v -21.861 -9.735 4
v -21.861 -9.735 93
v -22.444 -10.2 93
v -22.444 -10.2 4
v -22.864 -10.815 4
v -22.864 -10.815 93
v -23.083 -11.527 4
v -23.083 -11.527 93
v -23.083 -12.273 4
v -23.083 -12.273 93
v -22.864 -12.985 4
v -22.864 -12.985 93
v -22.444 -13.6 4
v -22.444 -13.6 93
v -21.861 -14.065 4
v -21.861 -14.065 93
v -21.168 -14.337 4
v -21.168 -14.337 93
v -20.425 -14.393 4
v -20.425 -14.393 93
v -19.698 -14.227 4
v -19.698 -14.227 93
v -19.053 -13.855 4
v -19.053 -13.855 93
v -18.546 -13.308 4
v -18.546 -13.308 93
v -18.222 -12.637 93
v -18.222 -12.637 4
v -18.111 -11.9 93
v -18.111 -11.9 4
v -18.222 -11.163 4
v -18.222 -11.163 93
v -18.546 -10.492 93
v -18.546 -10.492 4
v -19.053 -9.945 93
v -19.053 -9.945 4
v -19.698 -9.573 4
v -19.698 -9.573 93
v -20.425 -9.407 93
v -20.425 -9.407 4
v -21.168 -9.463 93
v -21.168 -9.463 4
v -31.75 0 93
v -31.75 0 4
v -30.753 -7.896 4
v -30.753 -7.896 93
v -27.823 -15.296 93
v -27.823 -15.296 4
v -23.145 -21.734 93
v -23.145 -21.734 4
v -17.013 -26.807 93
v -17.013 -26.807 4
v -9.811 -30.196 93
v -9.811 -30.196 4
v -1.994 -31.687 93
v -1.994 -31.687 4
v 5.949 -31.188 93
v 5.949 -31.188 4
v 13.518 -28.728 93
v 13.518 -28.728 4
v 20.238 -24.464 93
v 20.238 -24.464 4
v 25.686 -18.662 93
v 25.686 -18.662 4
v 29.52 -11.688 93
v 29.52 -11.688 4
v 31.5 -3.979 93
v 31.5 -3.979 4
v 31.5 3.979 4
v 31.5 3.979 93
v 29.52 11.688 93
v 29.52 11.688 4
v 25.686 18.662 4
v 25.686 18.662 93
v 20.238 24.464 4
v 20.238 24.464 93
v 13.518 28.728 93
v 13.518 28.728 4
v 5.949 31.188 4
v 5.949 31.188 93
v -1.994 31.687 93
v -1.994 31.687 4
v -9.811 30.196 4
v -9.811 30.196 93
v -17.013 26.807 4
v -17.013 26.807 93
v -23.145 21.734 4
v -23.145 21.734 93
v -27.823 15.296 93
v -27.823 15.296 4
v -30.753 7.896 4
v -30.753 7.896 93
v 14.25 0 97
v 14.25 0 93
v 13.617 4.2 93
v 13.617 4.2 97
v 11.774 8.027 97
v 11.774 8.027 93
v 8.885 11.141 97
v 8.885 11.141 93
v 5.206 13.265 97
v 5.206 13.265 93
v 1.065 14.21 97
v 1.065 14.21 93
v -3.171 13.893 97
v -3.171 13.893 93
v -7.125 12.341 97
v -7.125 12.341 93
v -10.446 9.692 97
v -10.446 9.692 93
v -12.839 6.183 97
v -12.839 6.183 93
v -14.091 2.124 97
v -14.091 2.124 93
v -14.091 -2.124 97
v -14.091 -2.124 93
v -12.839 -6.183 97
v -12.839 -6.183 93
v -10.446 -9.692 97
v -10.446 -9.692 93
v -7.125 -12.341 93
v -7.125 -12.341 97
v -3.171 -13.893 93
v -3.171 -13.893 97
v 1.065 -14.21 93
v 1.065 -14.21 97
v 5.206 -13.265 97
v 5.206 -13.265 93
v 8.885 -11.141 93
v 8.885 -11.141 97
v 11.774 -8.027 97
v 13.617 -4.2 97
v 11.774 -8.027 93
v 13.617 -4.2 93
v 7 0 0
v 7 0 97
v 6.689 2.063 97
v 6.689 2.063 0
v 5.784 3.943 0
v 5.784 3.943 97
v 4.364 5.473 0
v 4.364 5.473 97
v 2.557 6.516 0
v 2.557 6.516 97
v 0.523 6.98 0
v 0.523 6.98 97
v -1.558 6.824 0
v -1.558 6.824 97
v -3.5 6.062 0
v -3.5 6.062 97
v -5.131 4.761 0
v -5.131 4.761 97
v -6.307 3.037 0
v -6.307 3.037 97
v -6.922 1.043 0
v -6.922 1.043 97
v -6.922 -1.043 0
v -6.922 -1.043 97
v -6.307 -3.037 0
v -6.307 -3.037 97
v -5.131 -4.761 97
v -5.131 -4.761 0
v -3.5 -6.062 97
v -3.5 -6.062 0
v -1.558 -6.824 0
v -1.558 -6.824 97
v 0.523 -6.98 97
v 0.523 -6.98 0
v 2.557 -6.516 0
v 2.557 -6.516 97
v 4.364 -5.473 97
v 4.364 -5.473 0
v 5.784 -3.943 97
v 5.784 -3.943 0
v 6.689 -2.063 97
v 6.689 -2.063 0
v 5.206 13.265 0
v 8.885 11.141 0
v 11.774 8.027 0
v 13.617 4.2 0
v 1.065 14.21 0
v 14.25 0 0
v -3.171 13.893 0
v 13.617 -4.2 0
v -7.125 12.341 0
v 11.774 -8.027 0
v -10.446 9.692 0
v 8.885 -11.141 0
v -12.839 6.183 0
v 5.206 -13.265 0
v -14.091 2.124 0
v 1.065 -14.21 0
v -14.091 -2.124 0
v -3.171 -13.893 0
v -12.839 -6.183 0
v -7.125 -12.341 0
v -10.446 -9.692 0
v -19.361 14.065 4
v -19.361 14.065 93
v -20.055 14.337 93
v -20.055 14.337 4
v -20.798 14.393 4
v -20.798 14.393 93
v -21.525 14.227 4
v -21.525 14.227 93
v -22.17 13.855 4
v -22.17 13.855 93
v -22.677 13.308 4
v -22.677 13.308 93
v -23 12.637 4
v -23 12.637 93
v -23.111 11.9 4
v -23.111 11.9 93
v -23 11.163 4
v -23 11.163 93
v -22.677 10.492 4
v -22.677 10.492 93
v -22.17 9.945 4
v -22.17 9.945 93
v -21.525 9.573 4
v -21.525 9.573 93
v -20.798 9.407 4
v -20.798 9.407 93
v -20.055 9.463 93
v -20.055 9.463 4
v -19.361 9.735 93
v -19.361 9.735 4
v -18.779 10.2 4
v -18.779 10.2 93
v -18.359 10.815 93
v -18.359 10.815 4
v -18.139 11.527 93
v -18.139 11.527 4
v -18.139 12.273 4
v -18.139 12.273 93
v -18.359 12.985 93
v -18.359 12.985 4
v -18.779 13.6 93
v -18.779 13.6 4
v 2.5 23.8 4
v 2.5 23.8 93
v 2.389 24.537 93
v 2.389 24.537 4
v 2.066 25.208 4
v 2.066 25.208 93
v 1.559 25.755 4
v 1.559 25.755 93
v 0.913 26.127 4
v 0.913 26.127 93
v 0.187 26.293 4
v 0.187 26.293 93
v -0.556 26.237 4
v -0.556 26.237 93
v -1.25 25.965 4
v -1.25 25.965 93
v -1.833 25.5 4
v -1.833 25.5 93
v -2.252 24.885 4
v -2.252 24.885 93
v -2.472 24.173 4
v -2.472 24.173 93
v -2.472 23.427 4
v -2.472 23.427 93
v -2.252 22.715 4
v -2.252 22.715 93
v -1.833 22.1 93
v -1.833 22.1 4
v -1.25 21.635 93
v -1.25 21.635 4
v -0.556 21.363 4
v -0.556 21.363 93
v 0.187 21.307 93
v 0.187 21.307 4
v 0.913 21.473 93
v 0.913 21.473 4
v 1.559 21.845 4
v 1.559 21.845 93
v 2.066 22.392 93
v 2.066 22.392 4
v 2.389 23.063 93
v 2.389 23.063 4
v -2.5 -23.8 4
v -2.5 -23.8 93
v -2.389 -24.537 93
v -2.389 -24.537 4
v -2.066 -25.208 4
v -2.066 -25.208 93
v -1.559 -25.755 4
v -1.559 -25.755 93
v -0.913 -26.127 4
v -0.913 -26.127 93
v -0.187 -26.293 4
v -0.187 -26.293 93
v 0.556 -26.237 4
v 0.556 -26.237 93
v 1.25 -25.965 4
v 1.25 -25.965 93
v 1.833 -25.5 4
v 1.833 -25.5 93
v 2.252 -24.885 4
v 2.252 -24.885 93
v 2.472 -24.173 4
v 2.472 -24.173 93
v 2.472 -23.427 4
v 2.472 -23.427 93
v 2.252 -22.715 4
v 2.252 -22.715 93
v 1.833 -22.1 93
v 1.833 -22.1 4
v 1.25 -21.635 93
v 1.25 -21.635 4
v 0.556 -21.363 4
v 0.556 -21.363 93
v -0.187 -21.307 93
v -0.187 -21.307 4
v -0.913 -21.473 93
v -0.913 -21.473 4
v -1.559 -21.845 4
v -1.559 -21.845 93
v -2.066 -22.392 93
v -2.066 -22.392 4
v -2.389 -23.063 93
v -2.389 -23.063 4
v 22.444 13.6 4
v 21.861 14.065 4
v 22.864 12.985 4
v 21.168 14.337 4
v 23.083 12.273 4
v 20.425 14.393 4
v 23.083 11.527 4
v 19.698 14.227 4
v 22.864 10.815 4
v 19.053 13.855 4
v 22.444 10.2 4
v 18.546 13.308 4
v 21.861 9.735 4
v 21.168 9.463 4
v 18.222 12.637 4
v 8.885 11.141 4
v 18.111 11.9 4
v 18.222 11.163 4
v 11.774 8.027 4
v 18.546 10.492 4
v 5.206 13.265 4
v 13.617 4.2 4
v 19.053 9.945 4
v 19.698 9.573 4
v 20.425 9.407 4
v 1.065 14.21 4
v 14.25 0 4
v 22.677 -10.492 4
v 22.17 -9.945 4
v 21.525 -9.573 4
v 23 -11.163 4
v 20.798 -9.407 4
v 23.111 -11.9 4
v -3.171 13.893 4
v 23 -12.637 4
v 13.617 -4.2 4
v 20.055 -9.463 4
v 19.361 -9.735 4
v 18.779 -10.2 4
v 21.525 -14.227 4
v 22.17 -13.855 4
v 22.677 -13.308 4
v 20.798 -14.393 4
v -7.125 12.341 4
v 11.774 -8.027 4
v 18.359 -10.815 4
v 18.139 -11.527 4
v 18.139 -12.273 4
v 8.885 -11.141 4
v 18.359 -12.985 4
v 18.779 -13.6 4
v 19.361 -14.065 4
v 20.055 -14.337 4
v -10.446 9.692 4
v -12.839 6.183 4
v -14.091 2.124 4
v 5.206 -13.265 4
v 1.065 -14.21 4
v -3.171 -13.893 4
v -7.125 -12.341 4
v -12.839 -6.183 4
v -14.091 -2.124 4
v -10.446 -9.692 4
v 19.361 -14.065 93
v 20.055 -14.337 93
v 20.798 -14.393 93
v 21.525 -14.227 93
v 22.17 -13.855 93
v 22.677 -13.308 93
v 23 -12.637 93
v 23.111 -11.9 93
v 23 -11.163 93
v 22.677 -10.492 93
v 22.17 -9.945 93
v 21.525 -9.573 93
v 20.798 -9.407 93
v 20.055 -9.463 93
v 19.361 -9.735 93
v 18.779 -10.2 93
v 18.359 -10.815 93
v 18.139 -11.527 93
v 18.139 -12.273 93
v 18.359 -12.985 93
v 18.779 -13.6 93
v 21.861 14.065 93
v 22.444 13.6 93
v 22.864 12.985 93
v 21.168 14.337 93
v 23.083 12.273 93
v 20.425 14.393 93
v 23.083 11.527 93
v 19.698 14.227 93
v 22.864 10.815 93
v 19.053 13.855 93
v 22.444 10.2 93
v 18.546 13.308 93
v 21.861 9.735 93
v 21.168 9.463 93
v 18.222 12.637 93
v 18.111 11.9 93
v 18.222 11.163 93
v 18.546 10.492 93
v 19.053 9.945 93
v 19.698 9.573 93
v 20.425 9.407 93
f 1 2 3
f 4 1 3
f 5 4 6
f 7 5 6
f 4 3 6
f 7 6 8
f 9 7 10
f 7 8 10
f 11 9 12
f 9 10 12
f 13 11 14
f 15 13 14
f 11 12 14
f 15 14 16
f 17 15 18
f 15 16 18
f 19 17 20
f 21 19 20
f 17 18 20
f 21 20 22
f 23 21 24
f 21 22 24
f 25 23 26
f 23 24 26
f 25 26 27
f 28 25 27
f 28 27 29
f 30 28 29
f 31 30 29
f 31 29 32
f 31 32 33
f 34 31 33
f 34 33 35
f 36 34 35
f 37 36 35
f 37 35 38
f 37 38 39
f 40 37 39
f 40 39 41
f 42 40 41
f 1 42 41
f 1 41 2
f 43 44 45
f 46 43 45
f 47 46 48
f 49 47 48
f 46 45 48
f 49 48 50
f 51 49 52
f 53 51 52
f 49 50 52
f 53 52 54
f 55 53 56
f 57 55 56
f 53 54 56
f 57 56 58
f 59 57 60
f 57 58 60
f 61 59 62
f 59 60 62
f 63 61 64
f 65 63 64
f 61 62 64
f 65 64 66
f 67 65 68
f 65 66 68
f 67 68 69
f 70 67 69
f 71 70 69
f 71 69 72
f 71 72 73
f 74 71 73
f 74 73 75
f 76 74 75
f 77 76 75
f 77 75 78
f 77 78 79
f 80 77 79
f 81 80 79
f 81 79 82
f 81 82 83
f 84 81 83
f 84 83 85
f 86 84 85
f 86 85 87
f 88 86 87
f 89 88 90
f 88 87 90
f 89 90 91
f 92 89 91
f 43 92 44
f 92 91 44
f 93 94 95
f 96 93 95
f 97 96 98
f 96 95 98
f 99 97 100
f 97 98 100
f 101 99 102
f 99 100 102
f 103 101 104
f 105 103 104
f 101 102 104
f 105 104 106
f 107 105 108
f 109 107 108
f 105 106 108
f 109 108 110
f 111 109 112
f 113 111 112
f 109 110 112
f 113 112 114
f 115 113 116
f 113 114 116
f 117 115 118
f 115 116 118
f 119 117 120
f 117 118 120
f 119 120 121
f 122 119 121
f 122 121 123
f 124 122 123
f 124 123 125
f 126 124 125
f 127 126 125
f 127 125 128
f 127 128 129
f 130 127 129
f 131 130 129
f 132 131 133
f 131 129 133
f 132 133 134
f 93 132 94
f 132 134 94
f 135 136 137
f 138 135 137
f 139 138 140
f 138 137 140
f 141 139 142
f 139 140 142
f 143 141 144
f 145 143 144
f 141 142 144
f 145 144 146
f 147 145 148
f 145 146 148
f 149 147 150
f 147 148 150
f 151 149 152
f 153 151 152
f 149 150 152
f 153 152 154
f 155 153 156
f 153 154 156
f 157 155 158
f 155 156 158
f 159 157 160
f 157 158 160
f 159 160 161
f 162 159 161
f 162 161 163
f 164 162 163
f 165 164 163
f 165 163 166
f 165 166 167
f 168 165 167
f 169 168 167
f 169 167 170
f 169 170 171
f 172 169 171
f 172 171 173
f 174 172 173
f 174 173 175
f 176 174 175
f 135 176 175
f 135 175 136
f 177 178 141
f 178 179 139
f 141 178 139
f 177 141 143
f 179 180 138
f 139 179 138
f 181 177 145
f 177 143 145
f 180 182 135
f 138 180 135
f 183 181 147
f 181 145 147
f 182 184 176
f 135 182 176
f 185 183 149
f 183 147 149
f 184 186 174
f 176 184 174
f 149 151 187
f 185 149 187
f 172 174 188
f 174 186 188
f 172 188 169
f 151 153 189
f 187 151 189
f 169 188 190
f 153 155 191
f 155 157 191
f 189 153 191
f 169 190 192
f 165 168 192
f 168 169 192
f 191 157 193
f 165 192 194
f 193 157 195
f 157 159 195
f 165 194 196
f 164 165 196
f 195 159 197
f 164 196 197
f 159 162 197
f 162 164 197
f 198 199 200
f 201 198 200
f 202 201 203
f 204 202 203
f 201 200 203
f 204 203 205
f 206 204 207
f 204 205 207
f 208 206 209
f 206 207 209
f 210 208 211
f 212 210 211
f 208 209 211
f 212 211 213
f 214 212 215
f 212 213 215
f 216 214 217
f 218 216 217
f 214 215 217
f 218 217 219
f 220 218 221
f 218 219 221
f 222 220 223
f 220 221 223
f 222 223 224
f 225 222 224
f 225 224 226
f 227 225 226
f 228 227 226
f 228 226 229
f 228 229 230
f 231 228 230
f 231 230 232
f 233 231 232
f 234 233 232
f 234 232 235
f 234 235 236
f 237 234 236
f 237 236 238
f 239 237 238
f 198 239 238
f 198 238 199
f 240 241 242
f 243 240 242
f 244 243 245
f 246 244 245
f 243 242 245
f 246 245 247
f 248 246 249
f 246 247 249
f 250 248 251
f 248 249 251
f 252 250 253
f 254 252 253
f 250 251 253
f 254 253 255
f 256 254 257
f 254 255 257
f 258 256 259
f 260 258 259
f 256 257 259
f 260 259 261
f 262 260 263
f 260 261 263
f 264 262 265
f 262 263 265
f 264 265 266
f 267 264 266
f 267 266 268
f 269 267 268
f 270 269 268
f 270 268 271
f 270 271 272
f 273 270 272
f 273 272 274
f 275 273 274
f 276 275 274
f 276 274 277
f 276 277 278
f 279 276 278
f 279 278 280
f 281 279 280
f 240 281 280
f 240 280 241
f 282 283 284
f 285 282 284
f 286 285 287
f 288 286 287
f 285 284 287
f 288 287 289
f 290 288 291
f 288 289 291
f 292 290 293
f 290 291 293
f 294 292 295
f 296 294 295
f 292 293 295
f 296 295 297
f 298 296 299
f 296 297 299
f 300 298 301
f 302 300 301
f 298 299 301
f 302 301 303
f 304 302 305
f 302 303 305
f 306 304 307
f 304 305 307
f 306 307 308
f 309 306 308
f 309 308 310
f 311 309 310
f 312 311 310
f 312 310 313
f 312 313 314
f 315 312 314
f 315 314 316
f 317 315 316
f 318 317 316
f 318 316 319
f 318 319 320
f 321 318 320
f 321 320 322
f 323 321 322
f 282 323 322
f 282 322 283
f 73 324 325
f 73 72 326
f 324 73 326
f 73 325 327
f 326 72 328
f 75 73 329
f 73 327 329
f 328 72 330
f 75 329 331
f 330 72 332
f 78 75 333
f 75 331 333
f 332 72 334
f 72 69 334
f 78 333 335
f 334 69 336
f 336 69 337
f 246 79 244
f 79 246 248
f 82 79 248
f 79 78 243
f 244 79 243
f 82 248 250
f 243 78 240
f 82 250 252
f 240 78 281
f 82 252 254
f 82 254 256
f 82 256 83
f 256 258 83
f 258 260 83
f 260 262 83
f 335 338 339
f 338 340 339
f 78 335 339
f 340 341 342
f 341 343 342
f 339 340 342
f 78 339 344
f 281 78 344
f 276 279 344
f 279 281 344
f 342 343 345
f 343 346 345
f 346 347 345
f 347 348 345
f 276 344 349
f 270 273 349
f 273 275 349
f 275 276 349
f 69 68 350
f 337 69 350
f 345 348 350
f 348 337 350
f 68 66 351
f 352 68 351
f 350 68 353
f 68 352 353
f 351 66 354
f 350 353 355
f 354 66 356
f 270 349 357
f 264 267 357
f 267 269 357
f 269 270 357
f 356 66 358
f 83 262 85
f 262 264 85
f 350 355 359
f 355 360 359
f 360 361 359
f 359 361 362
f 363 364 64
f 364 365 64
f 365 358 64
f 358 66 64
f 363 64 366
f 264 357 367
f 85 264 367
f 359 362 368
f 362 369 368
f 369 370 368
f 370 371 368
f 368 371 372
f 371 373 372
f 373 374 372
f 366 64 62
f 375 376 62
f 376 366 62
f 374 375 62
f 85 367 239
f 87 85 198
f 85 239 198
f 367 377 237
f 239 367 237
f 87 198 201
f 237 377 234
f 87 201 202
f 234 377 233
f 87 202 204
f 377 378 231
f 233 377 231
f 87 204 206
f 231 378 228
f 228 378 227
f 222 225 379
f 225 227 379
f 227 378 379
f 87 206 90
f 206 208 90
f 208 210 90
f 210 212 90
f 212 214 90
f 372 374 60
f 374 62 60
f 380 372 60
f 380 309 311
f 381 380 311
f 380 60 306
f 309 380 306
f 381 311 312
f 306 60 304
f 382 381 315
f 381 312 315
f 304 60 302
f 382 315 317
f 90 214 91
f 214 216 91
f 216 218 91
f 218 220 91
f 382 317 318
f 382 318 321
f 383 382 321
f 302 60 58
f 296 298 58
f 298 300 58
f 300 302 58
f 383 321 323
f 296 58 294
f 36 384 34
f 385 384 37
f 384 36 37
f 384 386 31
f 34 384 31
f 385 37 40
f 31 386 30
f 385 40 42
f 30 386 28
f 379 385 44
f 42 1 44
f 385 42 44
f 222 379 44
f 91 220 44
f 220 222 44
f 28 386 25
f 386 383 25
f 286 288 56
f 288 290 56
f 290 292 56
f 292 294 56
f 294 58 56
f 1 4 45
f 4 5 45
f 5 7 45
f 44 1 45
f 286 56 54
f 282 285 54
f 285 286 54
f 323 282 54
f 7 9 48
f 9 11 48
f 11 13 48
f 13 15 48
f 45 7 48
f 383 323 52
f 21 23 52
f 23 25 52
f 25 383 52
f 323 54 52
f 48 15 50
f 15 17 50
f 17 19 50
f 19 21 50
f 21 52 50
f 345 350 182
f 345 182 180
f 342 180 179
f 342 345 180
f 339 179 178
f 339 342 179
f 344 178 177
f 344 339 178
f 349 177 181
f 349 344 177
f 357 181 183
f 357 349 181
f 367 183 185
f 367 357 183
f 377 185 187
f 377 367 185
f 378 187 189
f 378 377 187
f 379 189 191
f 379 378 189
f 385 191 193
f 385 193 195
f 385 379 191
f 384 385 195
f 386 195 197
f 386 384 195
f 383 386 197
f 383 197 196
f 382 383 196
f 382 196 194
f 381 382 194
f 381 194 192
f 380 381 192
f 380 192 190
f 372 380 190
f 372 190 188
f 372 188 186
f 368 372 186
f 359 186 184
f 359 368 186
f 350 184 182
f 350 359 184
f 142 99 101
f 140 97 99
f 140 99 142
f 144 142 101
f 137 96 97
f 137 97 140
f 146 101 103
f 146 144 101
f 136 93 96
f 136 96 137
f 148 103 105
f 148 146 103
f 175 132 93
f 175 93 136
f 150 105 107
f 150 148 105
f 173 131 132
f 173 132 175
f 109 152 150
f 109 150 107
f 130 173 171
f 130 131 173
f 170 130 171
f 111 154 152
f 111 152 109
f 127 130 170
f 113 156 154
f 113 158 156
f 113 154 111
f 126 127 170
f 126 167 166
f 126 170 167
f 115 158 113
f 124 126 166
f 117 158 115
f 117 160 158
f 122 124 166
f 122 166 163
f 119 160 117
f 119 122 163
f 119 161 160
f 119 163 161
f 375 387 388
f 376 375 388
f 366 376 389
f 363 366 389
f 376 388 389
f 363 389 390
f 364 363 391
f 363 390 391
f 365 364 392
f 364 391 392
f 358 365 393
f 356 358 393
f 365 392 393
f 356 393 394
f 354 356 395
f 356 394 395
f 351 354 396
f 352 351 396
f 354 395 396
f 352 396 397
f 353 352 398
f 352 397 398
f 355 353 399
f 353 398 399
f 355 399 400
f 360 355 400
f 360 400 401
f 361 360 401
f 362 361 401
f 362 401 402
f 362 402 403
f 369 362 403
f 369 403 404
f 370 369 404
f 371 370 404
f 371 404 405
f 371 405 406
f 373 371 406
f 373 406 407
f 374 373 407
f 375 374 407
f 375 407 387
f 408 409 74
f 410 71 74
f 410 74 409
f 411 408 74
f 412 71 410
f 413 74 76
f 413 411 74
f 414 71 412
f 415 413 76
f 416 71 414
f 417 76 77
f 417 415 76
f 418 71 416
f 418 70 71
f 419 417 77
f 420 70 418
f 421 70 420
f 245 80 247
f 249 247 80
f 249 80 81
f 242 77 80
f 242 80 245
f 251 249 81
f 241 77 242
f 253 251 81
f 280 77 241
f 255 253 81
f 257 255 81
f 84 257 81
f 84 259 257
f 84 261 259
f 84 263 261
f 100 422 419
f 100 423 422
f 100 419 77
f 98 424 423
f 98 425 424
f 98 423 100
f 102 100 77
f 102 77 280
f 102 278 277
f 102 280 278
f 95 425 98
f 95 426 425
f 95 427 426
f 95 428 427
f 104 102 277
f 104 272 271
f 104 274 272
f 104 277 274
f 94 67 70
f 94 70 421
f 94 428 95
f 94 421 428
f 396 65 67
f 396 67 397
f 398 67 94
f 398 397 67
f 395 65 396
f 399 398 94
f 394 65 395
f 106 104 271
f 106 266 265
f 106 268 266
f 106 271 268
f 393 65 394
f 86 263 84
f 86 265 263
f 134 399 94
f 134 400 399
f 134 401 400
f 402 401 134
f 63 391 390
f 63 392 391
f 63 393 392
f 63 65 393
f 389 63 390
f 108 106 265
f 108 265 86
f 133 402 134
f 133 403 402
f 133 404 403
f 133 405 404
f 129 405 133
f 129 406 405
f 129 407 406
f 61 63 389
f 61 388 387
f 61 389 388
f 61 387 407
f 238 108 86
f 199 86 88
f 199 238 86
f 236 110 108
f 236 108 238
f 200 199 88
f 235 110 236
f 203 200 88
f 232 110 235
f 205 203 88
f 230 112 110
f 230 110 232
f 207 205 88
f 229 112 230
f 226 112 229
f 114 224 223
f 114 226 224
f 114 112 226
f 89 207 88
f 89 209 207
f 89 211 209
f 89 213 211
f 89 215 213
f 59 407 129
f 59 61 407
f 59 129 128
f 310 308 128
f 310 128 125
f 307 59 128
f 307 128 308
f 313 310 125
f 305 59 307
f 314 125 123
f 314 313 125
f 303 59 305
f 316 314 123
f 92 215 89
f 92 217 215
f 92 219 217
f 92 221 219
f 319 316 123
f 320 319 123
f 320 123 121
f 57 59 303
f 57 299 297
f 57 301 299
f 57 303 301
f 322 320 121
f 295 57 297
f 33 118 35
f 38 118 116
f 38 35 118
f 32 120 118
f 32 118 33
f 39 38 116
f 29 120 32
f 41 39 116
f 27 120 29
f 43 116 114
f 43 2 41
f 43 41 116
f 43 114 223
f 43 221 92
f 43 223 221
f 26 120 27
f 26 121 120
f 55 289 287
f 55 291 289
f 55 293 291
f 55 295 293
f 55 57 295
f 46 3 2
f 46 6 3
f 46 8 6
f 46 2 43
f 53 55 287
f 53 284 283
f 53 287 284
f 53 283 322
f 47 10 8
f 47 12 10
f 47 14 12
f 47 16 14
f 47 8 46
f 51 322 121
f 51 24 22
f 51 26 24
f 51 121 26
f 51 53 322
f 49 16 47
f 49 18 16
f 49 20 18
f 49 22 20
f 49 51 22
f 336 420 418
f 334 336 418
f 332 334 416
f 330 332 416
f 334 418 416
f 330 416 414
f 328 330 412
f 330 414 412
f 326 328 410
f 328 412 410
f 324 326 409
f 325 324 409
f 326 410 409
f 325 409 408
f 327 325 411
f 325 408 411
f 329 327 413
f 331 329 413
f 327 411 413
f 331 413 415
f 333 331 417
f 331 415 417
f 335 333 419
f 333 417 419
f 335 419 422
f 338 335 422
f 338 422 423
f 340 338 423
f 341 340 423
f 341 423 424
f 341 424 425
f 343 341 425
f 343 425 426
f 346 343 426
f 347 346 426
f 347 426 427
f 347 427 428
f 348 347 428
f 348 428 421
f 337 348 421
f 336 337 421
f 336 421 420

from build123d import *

# Parameters (mm, degrees)
CROQUIS3_R              = 31.75
SALIENTE_EXTRUIR3_DEPTH = 97
CROQUIS4_R              = 7
CORTAR_EXTRUIR1_DEPTH   = 107.888376356
CROQUIS8_R              = 2.5
CORTAR_EXTRUIR6_DEPTH   = 107.888376356
MATRIZC1_COUNT          = 6
CUT_EXTRUDE1_START      = -4
SKETCH1_R               = 31.75
SKETCH1_R_2             = 14.25
CUT_EXTRUDE1_DEPTH      = 4


with BuildPart() as part:
    # Croquis3 → Saliente-Extruir3 (new body)
    with BuildSketch(Plane.XY):
        with Locations(Location((0, 0, 0), (0, 0, 180))):
            Circle(CROQUIS3_R)
    extrude(amount=SALIENTE_EXTRUIR3_DEPTH)

    # Croquis4 → Cortar-Extruir1 (cut, through all)
    with BuildSketch(Plane.XY.offset(97)):
        Circle(CROQUIS4_R)
    extrude(amount=-CORTAR_EXTRUIR1_DEPTH, mode=Mode.SUBTRACT)

    # Croquis8 → Cortar-Extruir6 (cut, through all)
    with BuildSketch(Plane.XY.offset(97)):
        with Locations((0, 23.8)):
            Circle(CROQUIS8_R)
    cortar_extruir6 = extrude(amount=-CORTAR_EXTRUIR6_DEPTH, mode=Mode.SUBTRACT)

    # MatrizC1: Cortar-Extruir6 ×6 about axis
    matrizc1_axis = Axis((0, 0, 0), (0, 0, 1))
    for i in range(1, MATRIZC1_COUNT):
        add(cortar_extruir6.rotate(matrizc1_axis, i * 360 / MATRIZC1_COUNT), mode=Mode.SUBTRACT)

    # Sketch1 → Cut-Extrude1 (cut)
    with BuildSketch(Plane.XY.offset(97).offset(CUT_EXTRUDE1_START)):
        with Locations(Location((0, 0, 0), (0, 0, 180))):
            Circle(SKETCH1_R)
        Circle(SKETCH1_R_2, mode=Mode.SUBTRACT)
    cut_extrude1 = extrude(amount=CUT_EXTRUDE1_DEPTH, mode=Mode.SUBTRACT)

    # Mirror1: Cut-Extrude1 across plane
    add(cut_extrude1.mirror(Plane.XY.offset(48.5)), mode=Mode.SUBTRACT)


solid = part.part
